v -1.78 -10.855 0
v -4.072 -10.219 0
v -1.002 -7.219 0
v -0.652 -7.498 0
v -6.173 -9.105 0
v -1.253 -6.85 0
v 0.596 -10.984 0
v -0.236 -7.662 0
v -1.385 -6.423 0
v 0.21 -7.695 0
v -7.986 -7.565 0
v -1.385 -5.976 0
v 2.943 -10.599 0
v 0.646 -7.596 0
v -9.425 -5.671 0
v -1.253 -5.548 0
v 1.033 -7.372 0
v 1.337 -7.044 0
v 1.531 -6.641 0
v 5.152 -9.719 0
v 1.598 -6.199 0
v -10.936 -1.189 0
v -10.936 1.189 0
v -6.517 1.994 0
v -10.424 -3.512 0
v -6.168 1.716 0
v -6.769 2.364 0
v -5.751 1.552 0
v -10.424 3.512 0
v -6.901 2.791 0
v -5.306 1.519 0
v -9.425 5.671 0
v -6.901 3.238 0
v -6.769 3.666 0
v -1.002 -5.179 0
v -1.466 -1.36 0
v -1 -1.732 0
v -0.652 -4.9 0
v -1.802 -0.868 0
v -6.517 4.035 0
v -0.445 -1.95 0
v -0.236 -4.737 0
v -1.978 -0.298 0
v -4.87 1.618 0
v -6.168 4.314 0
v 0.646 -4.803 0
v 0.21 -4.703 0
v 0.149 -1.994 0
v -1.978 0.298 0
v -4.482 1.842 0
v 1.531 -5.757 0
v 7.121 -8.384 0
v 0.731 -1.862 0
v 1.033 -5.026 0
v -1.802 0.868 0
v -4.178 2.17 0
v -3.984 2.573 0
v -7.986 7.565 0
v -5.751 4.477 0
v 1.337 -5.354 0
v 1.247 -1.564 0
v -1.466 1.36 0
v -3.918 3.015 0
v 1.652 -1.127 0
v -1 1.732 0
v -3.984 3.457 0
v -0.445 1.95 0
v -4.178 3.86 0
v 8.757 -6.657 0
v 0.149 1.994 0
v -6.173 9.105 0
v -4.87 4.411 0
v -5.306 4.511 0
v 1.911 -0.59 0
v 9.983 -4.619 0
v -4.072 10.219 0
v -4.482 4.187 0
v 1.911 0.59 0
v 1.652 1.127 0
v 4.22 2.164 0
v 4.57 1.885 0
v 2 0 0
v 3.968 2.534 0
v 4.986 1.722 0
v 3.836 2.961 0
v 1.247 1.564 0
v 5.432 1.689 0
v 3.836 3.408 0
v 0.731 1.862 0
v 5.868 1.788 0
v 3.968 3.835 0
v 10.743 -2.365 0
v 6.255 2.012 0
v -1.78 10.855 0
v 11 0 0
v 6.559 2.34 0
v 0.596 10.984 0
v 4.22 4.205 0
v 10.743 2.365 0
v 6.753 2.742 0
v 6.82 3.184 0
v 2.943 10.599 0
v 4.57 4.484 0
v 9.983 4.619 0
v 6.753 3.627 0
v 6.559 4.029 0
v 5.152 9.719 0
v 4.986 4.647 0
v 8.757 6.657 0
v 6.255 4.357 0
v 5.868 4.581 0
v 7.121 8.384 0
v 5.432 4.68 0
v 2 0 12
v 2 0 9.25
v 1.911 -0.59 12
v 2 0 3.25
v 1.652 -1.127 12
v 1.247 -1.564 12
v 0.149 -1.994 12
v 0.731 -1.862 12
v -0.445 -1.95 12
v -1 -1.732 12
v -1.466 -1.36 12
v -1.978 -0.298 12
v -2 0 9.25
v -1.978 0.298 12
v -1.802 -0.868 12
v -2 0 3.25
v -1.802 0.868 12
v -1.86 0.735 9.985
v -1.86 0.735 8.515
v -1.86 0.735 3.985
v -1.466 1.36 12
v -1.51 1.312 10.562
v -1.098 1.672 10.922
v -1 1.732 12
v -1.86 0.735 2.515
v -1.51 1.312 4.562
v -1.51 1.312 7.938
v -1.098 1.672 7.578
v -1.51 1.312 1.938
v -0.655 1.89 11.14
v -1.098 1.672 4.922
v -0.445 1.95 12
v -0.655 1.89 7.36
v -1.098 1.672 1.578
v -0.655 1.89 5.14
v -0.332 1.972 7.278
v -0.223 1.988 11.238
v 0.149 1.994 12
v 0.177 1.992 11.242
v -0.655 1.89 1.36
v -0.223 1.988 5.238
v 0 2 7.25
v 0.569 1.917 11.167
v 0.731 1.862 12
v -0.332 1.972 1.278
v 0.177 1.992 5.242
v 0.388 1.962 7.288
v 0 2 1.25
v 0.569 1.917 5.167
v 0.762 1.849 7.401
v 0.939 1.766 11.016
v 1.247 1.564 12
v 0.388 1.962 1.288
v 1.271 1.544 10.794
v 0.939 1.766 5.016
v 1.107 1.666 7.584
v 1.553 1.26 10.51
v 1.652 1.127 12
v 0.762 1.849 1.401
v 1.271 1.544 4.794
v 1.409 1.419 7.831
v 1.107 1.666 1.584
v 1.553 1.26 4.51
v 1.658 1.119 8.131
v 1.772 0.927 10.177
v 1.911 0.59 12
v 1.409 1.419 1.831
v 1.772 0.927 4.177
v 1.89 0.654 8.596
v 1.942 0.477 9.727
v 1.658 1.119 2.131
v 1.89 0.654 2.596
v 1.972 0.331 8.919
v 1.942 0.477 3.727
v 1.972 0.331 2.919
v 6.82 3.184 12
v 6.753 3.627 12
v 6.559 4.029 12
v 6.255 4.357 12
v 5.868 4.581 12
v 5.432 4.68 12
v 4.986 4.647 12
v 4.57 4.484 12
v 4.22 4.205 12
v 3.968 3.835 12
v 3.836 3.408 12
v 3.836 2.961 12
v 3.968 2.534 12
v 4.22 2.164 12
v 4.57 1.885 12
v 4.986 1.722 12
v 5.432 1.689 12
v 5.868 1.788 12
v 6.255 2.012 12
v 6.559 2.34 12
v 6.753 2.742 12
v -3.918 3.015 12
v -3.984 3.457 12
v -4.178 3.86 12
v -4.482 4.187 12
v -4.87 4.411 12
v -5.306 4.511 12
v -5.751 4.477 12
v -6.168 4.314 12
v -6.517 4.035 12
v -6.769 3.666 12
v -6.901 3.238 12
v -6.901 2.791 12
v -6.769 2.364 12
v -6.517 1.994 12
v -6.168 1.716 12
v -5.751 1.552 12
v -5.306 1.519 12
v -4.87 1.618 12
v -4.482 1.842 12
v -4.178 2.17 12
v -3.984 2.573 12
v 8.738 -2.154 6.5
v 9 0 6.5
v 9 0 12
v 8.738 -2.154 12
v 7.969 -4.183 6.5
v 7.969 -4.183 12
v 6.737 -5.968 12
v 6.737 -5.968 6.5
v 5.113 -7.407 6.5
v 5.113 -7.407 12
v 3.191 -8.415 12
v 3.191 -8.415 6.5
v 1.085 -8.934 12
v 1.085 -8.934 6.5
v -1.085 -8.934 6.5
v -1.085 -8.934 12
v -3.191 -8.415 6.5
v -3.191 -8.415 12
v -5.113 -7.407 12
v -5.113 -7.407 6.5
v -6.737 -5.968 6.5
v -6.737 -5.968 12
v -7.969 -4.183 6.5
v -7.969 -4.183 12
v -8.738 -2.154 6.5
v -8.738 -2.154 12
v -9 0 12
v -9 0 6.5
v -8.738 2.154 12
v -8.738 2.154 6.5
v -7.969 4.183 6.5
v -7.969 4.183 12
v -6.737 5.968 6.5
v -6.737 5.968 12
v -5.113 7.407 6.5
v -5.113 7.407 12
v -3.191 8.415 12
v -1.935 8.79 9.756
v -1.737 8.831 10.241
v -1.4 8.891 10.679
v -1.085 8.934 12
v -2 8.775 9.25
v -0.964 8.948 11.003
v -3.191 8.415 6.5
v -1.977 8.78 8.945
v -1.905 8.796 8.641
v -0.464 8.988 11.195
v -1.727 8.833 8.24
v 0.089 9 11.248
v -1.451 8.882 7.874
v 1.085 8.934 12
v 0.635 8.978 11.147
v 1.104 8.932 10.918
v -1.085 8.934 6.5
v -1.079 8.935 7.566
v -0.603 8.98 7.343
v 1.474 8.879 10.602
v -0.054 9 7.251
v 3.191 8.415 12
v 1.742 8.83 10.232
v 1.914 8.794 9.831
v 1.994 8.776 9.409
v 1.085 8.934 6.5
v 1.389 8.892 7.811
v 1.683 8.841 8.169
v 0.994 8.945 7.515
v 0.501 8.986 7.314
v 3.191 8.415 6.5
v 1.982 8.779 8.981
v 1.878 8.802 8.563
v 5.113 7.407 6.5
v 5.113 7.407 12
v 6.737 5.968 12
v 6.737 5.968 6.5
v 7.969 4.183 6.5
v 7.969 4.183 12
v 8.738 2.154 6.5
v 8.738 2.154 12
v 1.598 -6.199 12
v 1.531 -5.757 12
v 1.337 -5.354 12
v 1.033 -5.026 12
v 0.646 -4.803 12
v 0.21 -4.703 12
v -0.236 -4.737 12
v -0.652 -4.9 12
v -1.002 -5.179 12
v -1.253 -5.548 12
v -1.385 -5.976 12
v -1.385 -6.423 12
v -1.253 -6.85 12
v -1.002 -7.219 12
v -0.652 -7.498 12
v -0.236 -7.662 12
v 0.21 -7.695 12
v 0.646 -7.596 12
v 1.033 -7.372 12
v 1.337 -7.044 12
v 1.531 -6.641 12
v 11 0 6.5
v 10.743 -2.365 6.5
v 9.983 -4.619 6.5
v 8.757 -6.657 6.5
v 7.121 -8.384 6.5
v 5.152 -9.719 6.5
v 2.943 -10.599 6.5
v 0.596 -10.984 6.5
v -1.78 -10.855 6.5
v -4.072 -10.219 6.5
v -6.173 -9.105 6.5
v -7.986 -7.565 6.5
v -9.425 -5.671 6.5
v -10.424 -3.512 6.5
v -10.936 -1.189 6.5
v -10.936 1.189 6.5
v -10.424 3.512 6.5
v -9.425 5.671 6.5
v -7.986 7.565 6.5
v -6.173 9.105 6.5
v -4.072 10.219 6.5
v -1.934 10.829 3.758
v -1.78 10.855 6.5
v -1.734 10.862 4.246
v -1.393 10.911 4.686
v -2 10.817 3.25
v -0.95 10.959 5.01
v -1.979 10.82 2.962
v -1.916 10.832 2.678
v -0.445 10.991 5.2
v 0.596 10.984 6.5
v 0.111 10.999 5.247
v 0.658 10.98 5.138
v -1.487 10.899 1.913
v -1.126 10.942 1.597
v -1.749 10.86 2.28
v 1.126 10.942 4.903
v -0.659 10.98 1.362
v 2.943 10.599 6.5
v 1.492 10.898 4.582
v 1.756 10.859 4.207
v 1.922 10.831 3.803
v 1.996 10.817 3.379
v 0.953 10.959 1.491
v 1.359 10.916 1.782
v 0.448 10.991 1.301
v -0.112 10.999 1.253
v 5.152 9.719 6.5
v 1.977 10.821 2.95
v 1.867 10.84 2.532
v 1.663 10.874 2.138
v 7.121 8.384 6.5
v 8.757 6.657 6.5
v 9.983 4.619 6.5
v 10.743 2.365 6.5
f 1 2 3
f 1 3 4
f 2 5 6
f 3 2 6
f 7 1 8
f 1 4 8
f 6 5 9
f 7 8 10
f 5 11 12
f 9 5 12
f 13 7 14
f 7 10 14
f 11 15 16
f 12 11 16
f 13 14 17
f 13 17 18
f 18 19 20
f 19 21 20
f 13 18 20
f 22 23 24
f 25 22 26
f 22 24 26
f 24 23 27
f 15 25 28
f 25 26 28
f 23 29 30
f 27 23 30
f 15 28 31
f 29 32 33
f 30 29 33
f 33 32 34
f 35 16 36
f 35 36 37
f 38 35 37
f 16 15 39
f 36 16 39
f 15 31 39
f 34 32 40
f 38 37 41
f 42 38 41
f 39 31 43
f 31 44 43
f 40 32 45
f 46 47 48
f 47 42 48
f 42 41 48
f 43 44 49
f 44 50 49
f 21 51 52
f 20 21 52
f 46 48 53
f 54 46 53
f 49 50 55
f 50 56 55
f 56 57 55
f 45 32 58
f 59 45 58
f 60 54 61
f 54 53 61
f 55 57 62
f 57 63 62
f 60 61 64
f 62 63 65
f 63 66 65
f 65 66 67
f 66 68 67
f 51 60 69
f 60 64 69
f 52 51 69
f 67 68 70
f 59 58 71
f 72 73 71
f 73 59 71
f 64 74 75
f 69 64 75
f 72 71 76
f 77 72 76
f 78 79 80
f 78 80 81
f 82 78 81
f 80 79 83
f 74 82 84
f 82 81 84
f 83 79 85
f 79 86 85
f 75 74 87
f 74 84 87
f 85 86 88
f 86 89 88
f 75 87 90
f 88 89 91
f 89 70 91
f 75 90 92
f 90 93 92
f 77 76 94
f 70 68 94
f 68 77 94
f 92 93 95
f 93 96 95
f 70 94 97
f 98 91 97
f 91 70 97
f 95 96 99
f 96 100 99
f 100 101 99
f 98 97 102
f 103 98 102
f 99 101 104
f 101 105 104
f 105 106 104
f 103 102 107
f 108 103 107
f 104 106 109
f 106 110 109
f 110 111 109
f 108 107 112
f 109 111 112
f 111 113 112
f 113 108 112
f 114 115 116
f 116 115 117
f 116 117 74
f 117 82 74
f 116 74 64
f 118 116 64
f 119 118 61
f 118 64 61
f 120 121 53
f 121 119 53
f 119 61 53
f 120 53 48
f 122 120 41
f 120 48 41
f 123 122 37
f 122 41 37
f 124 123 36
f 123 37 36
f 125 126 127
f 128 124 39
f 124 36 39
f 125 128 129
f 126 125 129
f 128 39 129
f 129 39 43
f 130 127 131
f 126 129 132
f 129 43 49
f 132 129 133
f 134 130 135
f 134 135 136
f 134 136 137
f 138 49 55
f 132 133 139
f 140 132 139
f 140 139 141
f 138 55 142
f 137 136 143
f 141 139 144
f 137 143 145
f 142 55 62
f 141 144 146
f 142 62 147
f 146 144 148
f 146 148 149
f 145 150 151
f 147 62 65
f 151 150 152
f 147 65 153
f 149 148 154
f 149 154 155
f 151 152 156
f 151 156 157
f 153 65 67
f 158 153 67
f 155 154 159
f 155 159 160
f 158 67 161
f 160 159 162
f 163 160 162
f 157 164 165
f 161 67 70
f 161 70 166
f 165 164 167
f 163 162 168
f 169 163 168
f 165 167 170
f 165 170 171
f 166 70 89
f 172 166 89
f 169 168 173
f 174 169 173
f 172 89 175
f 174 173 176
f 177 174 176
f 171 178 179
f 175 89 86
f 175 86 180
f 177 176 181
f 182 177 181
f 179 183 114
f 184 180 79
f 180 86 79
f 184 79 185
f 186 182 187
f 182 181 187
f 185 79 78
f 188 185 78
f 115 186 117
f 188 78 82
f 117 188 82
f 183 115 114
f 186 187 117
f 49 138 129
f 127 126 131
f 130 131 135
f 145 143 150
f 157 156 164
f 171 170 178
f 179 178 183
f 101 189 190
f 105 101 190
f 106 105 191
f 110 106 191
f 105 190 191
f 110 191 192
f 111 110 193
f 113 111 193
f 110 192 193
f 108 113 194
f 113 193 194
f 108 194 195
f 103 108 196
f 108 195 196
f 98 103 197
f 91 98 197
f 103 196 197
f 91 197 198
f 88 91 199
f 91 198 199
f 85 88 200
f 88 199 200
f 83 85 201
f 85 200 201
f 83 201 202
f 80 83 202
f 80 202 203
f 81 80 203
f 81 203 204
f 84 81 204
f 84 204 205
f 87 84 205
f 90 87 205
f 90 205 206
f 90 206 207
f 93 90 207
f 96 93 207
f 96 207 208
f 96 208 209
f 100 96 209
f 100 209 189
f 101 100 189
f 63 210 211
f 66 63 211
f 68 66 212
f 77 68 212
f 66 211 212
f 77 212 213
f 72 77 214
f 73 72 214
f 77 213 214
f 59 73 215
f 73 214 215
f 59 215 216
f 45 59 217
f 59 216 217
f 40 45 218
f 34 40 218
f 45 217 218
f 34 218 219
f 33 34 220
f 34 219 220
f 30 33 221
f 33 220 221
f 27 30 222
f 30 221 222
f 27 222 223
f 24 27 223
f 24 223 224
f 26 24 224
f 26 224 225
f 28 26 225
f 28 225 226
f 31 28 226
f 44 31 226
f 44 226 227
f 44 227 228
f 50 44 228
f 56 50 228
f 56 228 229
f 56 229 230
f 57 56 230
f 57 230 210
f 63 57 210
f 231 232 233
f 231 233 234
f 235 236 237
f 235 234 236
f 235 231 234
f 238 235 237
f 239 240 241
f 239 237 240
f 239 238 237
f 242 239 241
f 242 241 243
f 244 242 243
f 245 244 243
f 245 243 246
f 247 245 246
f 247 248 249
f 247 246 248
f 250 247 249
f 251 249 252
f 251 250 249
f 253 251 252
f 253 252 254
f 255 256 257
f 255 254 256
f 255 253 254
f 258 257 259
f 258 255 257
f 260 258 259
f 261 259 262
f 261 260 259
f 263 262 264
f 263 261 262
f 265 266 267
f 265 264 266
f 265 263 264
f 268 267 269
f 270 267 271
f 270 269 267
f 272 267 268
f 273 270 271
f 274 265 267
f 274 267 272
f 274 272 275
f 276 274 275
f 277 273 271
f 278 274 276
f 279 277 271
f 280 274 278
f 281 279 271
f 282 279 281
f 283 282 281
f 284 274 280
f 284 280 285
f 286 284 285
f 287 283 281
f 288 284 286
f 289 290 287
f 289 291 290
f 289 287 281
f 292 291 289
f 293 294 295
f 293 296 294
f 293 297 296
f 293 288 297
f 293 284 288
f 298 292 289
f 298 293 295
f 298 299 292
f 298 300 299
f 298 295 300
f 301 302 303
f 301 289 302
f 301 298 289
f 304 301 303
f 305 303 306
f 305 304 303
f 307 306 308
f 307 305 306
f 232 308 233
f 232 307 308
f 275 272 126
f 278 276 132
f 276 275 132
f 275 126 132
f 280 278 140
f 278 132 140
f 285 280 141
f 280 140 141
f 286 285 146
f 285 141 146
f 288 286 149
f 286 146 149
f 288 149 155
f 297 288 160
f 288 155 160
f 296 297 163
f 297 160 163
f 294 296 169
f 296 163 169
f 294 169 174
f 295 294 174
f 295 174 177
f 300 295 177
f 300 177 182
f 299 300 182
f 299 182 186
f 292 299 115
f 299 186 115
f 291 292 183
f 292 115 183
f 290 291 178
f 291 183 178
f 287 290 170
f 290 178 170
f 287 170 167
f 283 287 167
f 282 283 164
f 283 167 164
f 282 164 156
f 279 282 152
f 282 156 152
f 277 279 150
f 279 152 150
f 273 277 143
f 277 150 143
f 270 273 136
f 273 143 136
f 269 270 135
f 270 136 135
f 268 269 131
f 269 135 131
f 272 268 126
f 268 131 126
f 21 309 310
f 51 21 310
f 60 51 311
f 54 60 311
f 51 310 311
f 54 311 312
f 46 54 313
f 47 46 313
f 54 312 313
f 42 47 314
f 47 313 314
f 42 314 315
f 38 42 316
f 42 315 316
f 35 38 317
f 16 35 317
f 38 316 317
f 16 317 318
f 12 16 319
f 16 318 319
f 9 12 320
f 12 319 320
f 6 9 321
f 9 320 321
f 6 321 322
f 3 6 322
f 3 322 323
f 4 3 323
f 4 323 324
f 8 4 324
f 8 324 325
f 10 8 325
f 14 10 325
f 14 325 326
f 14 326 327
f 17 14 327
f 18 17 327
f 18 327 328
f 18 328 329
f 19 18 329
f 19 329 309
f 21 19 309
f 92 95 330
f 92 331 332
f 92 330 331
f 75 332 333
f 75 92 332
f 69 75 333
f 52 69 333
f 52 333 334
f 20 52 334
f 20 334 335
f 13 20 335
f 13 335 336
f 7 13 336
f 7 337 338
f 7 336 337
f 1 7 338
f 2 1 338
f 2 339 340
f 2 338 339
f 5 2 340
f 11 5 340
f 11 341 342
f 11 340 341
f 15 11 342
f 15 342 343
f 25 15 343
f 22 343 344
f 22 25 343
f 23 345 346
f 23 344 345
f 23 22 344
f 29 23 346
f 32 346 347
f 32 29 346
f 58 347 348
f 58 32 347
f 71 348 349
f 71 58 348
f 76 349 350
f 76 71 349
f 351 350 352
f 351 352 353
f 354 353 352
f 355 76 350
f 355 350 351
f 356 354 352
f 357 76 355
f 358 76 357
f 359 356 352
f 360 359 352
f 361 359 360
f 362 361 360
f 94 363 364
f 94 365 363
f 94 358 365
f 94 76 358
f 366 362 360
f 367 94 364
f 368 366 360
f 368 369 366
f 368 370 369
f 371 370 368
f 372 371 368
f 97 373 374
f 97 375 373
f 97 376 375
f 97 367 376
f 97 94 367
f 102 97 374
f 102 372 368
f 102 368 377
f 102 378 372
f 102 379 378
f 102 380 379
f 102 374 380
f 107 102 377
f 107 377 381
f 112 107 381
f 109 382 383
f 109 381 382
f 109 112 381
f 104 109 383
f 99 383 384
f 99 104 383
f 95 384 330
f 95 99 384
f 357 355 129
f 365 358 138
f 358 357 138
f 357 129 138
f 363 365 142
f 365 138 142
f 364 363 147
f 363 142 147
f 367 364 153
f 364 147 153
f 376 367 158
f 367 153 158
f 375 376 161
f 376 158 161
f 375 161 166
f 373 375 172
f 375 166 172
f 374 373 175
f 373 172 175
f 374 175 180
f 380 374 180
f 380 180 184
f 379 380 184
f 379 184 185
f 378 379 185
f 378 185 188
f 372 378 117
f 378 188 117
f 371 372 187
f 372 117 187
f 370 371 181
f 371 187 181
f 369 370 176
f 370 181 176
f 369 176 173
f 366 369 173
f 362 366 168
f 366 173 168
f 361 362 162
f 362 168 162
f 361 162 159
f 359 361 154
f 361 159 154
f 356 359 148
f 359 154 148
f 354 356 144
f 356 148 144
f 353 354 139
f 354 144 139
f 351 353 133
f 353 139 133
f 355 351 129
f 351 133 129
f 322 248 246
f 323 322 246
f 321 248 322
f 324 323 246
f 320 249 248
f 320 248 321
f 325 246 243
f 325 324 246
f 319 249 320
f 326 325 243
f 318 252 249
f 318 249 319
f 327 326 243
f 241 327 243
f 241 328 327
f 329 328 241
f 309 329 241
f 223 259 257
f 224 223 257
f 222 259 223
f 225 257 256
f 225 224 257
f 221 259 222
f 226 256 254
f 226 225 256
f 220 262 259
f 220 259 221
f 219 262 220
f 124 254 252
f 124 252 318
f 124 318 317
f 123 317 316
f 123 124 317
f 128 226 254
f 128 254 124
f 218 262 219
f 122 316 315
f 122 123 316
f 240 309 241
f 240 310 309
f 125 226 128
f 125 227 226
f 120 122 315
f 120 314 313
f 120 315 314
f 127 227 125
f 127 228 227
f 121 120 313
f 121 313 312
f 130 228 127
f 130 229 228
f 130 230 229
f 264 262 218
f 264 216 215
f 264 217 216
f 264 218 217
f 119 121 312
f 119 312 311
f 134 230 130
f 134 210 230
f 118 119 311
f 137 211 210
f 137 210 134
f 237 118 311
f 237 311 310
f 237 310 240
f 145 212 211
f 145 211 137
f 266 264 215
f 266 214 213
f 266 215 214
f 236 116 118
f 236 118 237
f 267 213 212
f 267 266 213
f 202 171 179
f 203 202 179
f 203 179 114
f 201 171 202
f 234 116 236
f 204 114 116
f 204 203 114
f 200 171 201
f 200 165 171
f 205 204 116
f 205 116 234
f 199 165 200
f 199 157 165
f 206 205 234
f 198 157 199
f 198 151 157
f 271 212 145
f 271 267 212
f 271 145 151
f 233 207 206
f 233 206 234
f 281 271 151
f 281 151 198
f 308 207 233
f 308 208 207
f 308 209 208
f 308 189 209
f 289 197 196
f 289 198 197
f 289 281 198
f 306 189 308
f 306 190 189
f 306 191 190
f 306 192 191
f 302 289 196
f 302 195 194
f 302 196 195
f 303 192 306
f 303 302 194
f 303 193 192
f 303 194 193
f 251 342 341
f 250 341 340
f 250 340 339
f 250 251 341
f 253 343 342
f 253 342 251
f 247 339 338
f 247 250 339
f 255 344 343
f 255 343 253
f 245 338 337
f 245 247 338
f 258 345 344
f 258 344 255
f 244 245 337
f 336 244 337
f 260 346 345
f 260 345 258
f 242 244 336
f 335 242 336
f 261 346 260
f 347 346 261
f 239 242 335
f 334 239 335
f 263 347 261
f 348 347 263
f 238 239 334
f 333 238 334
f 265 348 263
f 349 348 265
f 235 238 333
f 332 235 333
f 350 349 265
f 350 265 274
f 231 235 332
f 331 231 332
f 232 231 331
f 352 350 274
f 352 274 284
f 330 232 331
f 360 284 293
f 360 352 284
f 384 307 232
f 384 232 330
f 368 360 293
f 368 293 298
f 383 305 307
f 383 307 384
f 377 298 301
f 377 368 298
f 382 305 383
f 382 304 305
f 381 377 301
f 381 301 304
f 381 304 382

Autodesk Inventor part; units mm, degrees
ref_plane "YZ Plane" through (0, 0, 0) normal (1, 0, 0) x (0, 1, 0)
ref_plane "XZ Plane" through (0, 0, 0) normal (0, 1, 0) x (-1, 0, 0)
ref_plane "XY Plane" through (0, 0, 0) normal (0, 0, 1) x (1, 0, 0)
sketch "Sketch1" plane through (0, 0, 0) normal (0, 0, 1) x (1, 0, 0)
  circle A0 centre (0, 0) radius 11
  circle A1 centre (0, 0) radius 2
  dimension "d0" = 22
  dimension "d1" = 4
extrude "Extrusion1" add sketch "Sketch1" along normal blind 6.5
sketch "Sketch2" plane through (0, 0, 6.5) normal (0, 0, 1) x (1, 0, 0)
  circle A0 centre (0, 0) radius 9
  circle A1 centre (0, 0) radius 2
  dimension "d4" = 18
extrude "Extrusion2" add sketch "Sketch2" along normal blind 5.5
sketch "Sketch3" plane through (0, 0, 12) normal (0, 0, 1) x (1, 0, 0)
  circle A0 centre (-5.4177, 3.0147) radius 1.5
  circle A1 centre (0.098, -6.1992) radius 1.5
  circle A2 centre (5.3197, 3.1845) radius 1.5
  circle A3 centre (0, 0) radius 6.2 construction
  dimension "d21" = 12.4
  dimension "d7" = 3
  dimension "d10" = 360
extrude "Extrusion3" cut sketch "Sketch3" against normal through all
sketch "Sketch4" plane through (0, 0, 0) normal (0, 1, 0) x (-1, 0, 0)
  circle A0 centre (0, 9.25) radius 2
  circle A1 centre (0, 3.25) radius 2
  line L0 (0, 0) -> (0, 21.1328) construction
  dimension "d15" = 4
  dimension "d16" = 4
  dimension "d17" = 3.25
  dimension "d18" = 9.25
extrude "Extrusion4" cut sketch "Sketch4" along normal through all
thread "Thread1" size "M4x0.7" class "6H" standard "ISO Metric profile" full length
thread "Thread2" size "M4x0.7" class "6H" standard "ISO Metric profile" full length
thread "Thread3" size "M3x0.5" class "6H" standard "ISO Metric profile" full length
thread "Thread4" size "M3x0.5" class "6H" standard "ISO Metric profile" full length
thread "Thread5" size "M3x0.5" class "6H" standard "ANSI Metric M Profile" full length
properties part number "WheelAdapter-4mm" material "Aluminum 6061"
